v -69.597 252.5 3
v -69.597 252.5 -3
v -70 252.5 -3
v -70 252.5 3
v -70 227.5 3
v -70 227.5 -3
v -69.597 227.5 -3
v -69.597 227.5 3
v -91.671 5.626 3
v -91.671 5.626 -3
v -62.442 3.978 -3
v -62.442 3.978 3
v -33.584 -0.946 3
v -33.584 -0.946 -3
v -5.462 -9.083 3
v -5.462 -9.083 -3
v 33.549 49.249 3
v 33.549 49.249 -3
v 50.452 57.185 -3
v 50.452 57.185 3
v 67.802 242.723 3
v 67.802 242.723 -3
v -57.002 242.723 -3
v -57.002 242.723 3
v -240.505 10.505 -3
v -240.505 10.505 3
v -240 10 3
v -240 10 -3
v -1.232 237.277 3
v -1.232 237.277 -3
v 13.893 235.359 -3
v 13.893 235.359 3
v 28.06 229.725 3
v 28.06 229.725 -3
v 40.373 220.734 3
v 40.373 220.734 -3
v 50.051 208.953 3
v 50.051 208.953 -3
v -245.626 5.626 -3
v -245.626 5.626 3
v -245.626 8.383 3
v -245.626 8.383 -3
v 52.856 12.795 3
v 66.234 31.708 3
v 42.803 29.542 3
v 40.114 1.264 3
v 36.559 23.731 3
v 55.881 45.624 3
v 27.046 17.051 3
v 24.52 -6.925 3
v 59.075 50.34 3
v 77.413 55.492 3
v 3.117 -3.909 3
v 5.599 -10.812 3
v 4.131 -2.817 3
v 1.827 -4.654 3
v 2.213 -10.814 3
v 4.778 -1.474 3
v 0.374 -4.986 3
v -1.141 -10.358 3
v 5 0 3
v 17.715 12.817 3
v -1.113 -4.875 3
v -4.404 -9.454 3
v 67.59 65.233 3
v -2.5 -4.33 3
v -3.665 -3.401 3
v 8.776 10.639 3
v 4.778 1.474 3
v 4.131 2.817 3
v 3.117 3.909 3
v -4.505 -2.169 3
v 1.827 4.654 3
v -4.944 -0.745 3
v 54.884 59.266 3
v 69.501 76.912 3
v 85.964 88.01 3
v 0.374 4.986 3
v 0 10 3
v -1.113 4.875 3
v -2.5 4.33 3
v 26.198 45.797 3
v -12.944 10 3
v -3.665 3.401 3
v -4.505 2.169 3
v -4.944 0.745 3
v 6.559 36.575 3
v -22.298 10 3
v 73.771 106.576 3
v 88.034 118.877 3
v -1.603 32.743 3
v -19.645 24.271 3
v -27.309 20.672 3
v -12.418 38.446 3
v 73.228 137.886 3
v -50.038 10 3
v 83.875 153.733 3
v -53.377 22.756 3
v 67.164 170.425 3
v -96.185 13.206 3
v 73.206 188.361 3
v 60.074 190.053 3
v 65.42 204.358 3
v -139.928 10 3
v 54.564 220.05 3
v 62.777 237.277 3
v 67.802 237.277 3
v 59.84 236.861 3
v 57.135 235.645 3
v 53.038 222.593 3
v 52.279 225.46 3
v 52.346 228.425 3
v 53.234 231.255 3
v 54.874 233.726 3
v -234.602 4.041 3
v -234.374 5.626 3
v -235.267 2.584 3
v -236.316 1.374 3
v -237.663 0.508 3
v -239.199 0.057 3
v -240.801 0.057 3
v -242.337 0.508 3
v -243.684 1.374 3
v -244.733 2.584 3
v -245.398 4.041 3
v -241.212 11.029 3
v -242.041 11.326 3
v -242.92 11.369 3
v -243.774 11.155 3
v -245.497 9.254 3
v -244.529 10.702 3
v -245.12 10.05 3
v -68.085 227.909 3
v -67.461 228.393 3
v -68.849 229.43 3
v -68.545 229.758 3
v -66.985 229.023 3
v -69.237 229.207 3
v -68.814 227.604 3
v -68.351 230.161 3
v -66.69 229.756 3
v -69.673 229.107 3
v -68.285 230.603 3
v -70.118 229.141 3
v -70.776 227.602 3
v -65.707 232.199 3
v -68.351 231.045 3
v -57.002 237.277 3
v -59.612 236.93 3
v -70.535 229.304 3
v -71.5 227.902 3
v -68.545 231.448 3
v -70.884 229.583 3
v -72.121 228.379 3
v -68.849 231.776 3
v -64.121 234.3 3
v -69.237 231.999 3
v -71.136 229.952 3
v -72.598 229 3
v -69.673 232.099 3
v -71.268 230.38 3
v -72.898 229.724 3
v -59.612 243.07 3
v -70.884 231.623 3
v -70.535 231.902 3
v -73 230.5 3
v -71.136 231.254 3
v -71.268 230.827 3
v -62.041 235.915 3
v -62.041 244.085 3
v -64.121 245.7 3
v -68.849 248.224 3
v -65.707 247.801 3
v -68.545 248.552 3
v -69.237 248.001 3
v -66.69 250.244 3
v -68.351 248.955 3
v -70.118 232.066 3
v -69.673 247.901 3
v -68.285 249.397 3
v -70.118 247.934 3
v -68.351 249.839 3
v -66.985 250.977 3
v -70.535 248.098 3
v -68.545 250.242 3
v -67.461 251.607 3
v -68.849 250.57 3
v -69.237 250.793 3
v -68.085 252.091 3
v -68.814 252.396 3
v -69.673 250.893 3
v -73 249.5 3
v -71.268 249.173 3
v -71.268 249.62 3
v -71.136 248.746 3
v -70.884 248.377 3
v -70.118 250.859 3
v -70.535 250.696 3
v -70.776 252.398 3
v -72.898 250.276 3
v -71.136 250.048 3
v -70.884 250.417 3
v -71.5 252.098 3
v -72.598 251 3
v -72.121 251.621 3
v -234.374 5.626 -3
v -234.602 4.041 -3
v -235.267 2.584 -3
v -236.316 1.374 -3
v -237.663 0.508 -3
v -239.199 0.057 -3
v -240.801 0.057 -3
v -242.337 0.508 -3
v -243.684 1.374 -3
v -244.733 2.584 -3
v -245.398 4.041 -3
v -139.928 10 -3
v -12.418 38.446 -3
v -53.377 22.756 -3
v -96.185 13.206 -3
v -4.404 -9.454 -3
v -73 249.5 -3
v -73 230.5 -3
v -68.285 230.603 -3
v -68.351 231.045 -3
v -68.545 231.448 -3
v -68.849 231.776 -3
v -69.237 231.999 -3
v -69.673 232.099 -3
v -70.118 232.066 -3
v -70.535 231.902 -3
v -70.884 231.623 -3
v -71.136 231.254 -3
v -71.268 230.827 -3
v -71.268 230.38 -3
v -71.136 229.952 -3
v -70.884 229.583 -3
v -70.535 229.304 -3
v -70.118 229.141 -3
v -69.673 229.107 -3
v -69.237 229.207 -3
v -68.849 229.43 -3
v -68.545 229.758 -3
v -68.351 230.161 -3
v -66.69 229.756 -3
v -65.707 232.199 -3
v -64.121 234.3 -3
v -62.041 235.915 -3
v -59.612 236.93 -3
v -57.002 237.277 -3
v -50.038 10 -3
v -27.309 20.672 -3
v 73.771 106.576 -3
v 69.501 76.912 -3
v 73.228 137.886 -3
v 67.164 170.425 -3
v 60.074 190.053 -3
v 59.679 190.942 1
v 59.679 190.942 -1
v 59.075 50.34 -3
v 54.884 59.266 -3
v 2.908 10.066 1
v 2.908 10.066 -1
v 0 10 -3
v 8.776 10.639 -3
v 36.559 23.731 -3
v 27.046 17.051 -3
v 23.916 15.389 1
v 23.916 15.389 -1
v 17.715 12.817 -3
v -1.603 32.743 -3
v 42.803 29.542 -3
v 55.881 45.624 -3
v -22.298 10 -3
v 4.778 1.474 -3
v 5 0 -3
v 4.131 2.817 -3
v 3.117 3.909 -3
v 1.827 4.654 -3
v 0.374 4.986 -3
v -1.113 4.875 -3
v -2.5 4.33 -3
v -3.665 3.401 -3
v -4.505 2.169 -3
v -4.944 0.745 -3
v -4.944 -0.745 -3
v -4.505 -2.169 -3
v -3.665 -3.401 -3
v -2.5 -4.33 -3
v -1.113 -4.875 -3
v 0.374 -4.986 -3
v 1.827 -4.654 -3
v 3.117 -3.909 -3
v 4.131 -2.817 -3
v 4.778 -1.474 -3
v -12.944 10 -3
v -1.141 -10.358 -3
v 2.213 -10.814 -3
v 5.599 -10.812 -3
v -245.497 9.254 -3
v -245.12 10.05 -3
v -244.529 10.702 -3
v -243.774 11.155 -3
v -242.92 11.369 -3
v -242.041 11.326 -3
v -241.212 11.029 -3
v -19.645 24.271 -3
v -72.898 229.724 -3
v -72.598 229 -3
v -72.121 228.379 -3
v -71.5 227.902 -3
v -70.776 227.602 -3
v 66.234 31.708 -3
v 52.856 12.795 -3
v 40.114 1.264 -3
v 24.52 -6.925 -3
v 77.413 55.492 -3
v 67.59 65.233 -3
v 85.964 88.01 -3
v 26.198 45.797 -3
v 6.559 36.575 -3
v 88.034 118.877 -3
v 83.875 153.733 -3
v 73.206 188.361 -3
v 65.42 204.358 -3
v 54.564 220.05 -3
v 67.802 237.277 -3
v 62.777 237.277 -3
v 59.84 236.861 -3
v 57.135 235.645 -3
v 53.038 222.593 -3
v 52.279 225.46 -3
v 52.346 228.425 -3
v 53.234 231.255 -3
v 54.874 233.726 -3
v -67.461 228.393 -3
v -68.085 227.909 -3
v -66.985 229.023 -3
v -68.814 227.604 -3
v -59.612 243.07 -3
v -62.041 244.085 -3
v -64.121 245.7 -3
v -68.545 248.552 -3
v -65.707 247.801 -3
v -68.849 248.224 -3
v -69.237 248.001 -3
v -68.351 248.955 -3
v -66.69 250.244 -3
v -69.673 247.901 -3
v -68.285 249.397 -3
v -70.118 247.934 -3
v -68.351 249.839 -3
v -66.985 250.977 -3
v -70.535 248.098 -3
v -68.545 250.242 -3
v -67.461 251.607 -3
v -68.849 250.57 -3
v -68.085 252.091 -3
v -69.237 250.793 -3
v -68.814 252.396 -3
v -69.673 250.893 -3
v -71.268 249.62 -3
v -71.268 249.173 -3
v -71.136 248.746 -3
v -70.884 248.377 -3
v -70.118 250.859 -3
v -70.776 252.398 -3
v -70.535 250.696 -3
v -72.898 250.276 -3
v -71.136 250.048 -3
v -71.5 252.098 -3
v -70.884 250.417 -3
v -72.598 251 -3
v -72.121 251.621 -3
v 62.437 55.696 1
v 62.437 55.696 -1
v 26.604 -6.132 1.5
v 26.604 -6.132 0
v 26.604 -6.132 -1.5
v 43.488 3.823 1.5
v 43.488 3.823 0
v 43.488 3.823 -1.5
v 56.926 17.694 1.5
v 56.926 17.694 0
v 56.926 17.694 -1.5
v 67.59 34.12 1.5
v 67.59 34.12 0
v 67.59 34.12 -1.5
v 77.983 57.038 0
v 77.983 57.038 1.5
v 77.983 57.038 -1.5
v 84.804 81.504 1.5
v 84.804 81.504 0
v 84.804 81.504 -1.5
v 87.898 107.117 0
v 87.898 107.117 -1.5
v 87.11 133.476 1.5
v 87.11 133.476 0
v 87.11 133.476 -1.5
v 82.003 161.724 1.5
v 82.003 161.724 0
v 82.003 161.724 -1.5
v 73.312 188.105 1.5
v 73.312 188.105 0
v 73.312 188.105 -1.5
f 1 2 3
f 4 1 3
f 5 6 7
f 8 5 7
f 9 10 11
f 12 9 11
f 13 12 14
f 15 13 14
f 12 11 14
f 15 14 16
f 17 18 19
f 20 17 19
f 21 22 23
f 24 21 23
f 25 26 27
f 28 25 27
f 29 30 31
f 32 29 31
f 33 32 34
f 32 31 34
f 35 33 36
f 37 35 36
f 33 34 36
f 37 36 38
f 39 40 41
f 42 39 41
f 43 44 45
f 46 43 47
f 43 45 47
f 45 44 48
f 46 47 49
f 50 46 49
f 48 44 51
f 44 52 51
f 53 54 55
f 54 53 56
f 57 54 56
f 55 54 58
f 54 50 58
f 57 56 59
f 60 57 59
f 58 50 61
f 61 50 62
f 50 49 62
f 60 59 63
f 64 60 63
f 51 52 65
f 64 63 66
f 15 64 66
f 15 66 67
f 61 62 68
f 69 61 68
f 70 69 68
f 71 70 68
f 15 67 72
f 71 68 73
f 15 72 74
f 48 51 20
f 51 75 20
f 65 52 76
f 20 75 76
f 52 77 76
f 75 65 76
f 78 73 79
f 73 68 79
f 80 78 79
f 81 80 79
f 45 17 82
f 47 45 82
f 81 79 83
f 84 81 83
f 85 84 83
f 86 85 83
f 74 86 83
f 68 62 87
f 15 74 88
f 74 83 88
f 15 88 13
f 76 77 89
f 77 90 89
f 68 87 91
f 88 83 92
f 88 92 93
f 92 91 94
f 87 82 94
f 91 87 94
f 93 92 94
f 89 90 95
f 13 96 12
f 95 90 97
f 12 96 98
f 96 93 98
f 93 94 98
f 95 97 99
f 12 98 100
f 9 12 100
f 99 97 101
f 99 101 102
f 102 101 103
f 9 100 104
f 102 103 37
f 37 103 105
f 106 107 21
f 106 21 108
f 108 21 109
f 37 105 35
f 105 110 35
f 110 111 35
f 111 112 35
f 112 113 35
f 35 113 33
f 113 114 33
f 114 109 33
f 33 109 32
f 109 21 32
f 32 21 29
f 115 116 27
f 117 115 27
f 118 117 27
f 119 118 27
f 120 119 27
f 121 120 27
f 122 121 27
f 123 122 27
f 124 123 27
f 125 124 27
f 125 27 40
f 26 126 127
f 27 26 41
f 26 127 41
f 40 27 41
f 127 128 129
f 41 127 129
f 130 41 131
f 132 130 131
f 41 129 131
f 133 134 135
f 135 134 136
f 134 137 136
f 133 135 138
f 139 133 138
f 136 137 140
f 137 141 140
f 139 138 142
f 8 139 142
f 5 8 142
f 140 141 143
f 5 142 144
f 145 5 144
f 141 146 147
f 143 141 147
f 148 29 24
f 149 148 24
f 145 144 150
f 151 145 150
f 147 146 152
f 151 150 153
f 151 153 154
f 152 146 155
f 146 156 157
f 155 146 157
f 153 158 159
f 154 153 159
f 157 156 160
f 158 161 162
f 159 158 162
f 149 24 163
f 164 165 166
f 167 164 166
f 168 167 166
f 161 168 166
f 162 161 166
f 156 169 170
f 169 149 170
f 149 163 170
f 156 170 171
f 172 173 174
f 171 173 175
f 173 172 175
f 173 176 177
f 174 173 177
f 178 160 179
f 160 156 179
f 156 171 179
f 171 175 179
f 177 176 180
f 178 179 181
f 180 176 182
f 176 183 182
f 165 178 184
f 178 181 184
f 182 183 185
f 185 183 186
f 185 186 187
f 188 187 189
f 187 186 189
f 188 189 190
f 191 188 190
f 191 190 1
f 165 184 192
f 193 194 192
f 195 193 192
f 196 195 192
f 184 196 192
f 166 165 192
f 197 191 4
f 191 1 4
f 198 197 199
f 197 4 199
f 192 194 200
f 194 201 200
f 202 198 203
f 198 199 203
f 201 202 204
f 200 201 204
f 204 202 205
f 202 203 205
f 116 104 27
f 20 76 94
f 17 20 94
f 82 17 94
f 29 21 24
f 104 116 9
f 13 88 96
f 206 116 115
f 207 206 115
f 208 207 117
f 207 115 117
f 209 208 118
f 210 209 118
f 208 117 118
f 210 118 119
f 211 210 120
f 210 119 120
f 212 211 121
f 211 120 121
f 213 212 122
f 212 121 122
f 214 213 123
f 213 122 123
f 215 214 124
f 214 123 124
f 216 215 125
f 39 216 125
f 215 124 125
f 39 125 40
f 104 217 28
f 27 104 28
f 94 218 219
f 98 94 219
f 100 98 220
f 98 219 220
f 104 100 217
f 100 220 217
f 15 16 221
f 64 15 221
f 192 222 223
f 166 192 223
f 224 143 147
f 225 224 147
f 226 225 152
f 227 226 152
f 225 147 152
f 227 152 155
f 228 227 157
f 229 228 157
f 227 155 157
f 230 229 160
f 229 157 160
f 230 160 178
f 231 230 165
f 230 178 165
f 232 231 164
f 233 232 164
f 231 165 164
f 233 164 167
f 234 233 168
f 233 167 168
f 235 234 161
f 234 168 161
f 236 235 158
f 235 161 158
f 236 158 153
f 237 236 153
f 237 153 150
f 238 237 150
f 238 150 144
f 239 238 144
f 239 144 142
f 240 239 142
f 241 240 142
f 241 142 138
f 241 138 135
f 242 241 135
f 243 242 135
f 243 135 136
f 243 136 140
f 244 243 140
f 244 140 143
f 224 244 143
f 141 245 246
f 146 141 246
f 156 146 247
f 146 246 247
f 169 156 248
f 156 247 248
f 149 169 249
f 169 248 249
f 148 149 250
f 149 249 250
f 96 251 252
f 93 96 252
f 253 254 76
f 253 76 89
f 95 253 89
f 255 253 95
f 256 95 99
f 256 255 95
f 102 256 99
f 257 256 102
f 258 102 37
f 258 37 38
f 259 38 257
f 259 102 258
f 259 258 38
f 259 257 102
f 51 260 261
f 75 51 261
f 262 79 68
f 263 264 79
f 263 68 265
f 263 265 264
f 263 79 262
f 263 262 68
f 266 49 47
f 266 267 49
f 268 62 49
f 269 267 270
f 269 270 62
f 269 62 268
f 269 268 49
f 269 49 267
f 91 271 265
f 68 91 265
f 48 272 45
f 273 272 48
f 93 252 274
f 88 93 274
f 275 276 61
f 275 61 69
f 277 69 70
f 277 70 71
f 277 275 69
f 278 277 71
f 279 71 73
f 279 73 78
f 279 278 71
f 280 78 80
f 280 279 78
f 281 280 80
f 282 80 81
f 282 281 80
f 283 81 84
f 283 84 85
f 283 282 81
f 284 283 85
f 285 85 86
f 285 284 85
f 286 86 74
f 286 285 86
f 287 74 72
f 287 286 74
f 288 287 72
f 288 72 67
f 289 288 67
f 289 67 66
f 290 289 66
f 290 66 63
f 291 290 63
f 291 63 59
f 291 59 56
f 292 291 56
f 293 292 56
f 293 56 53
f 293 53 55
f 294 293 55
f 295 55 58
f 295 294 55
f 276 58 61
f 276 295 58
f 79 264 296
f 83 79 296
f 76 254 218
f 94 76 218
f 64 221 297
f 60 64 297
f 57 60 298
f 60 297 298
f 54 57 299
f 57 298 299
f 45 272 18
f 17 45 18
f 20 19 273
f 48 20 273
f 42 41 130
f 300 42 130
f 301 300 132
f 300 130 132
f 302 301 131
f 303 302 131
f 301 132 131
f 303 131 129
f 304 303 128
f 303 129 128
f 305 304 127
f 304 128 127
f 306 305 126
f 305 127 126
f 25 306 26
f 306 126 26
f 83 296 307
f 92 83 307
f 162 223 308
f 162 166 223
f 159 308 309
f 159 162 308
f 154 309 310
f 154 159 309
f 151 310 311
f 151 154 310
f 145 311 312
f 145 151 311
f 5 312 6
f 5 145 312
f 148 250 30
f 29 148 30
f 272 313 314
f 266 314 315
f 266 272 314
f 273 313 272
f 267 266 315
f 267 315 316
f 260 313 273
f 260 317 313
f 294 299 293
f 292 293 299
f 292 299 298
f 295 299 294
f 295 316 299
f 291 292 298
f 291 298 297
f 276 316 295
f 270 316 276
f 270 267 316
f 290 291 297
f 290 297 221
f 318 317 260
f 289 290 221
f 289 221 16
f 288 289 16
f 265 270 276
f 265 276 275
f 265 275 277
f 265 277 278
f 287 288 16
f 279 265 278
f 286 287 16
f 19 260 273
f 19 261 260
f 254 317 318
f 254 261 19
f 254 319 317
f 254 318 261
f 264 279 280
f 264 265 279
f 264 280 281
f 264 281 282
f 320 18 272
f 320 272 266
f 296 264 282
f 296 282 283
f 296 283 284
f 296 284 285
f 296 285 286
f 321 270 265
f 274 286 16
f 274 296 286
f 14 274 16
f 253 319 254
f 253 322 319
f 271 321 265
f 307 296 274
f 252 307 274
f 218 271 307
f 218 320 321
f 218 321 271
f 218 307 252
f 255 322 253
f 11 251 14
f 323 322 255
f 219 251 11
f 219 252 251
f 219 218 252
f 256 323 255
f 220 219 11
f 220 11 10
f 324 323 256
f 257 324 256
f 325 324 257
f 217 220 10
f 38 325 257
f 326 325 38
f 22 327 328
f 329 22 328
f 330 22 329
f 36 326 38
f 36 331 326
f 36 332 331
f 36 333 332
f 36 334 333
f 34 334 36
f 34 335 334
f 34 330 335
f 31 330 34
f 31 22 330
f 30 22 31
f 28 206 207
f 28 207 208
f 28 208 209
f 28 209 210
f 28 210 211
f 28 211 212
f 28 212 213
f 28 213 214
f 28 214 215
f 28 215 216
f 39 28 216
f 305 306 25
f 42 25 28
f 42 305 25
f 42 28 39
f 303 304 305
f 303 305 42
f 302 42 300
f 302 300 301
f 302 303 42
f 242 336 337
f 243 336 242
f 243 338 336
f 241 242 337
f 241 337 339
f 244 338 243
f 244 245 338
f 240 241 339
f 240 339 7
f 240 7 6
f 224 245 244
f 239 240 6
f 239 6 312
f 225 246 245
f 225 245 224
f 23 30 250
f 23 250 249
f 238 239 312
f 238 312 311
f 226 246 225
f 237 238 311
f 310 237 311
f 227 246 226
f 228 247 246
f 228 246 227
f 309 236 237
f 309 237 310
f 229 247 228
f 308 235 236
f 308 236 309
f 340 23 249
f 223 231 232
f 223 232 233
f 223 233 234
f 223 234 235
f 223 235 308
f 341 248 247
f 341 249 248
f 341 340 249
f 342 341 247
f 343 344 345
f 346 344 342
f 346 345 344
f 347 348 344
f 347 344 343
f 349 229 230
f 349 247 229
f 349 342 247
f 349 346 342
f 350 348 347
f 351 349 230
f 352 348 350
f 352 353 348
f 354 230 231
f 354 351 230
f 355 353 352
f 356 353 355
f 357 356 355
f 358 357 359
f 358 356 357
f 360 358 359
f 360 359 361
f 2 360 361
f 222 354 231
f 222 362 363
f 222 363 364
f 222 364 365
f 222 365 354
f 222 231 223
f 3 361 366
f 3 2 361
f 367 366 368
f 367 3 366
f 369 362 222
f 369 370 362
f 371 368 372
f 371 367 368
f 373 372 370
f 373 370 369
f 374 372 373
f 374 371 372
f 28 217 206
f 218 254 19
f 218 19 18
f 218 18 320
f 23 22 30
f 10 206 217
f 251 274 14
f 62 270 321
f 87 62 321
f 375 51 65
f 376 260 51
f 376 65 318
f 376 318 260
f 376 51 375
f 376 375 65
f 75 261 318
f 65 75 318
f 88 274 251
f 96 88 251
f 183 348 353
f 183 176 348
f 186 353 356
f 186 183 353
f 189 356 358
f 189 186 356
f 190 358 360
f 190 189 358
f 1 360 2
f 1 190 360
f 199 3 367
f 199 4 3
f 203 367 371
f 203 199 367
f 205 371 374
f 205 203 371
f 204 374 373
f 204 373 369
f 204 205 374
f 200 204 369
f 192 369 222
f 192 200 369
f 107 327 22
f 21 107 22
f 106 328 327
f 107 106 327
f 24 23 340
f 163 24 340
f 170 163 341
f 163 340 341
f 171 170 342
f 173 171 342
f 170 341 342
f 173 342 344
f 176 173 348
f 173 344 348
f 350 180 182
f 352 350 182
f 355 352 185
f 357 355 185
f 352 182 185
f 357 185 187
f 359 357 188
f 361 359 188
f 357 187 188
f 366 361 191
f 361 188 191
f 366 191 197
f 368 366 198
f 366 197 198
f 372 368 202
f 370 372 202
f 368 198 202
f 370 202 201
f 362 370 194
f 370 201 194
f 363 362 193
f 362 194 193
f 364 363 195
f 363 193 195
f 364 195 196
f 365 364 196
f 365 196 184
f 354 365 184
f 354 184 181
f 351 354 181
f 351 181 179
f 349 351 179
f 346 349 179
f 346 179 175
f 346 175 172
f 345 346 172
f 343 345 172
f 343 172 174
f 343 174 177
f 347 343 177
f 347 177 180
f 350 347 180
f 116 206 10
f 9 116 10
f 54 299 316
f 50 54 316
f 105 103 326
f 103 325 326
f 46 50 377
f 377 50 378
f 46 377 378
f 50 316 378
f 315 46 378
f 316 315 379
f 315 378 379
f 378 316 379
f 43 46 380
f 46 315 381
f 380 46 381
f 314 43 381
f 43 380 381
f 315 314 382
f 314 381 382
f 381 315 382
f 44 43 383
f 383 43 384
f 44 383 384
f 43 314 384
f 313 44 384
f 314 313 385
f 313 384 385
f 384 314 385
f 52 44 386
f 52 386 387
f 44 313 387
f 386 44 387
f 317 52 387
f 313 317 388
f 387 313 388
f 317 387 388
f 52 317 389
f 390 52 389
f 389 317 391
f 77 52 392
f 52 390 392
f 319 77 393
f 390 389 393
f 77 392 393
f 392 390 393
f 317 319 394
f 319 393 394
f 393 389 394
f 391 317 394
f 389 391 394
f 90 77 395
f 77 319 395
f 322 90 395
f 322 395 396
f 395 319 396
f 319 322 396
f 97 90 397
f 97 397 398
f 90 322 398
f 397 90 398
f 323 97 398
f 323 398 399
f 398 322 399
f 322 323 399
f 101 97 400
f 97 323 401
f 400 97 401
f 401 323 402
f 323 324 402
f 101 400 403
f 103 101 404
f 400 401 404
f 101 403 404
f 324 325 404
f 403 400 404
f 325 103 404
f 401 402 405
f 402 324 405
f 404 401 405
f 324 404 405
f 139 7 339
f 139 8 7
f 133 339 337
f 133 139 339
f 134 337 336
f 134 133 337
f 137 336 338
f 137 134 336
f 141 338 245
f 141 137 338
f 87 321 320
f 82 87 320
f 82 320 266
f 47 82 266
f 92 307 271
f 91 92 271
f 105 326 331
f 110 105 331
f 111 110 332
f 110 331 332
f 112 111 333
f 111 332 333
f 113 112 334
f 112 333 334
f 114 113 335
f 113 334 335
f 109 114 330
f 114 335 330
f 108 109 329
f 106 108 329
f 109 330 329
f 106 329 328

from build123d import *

# Parameters (mm, degrees)
BOSS_EXTRUDE1_DEPTH      = 3
BOSS_EXTRUDE1_DEPTH_BACK = 3
SKETCH1_R                = 5
FILLET1_START            = -3
FILLET1_DEPTH            = 6
SKETCH3_R                = 1.5
CUT_EXTRUDE1_DEPTH       = 349.413906295
FILLET2_R                = 3
BOSS_EXTRUDE2_DEPTH      = 6


with BuildPart() as part:
    # Sketch1 → Boss-Extrude1 (new, two sides: drawn at the far end of the back side and taken through both)
    with BuildSketch(Plane.XY.offset(-BOSS_EXTRUDE1_DEPTH_BACK)):
        with BuildLine():
            Line((-139.927663014, 10), (-240, 10))
            Line((-240, 10), (-240, 5.625896326))
            Line((-240, 5.625896326), (-91.67097898, 5.625896326))
            ThreePointArc((-91.67097898, 5.625896326), (-47.943457504, 1.922411841), (-5.461660623, -9.082535478))
            Line((-5.461660623, -9.082535478), (-4.403604208, -9.454396292))
            ThreePointArc((-4.403604208, -9.454396292), (0.528404036, -10.64278059), (5.598736393, -10.81216877))
            add(Edge.make_bspline(
                [(5.598736393, -10.81216877), (36.652992265, -8.693156062), (78.227632244, 36.40065328), (94.590344538, 116.465590815), (76.626831013, 184.736667386), (63.306328088, 209.262504208), (54.564036902, 220.049625577)],
                knots=[0.015792228, 0.015792228, 0.015792228, 0.015792228, 0.284946291, 0.62839983, 0.811916795, 0.93697406, 0.93697406, 0.93697406, 0.93697406], degree=3))
            ThreePointArc((54.564036902, 220.049625577), (53.234460191, 231.254741201), (62.776823889, 237.276840954))
            Line((62.776823889, 237.276840954), (67.80233028, 237.276840954))
            Line((67.80233028, 237.276840954), (67.80233028, 242.723159046))
            Line((67.80233028, 242.723159046), (-67, 242.723159046))
            Line((-67, 242.723159046), (-67, 252.5))
            Line((-67, 252.5), (-73, 252.5))
            Line((-73, 252.5), (-73, 227.5))
            Line((-73, 227.5), (-67, 227.5))
            Line((-67, 227.5), (-67, 237.276840954))
            Line((-67, 237.276840954), (-1.231721128, 237.276840954))
            ThreePointArc((-1.231721128, 237.276840954), (28.060310534, 229.72540467), (50.050624082, 208.953466413))
            add(Edge.make_bspline(
                [(69.500855603, 76.911874598), (72.264480227, 87.944058505), (76.527253704, 125.048471021), (70.268641745, 171.941971612), (53.737198263, 203.093850369), (50.050624082, 208.953466413)],
                knots=[0.407523856, 0.407523856, 0.407523856, 0.407523856, 0.537194929, 0.818083777, 0.885362915, 0.885362915, 0.885362915, 0.885362915], degree=3))
            Line((69.500855603, 76.911874598), (-12.418485843, 38.446304136))
            ThreePointArc((-12.418485843, 38.446304136), (-74.60580128, 17.197926272), (-139.927663014, 10))
        make_face()
        Polygon((-22.297907079, 10), (-50.037756473, 10), (-27.309138693, 20.672317834), align=None, mode=Mode.SUBTRACT)
        Circle(SKETCH1_R, mode=Mode.SUBTRACT)
        with BuildLine():
            Line((-12.943777745, 10), (-19.644842204, 24.271120406))
            Line((-19.644842204, 24.271120406), (-1.602641824, 32.742911289))
            Line((-1.602641824, 32.742911289), (8.776324123, 10.639039044))
            add(Edge.make_bspline(
                [(0, 10), (2.898943299, 10), (5.824093664, 10.191306611), (8.776324123, 10.639039044)],
                knots=[0, 0, 0, 0, 0.042648611, 0.042648611, 0.042648611, 0.042648611], degree=3))
            Line((0, 10), (-12.943777745, 10))
        make_face(mode=Mode.SUBTRACT)
        with BuildLine():
            Line((17.715361457, 12.81671237), (6.559363007, 36.5754149))
            Line((6.559363007, 36.5754149), (26.197910912, 45.79677746))
            Line((26.197910912, 45.79677746), (36.559125948, 23.730708969))
            add(Edge.make_bspline(
                [(17.715361457, 12.81671237), (23.876773005, 14.918250482), (30.155524994, 18.369562648), (36.559125948, 23.730708969)],
                knots=[0.085298322, 0.085298322, 0.085298322, 0.085298322, 0.172678594, 0.172678594, 0.172678594, 0.172678594], degree=3))
        make_face(mode=Mode.SUBTRACT)
        with BuildLine():
            Line((42.802893804, 29.541618599), (33.549359894, 49.248681172))
            Line((33.549359894, 49.248681172), (50.452093063, 57.185430446))
            Line((50.452093063, 57.185430446), (55.88081154, 45.623999347))
            add(Edge.make_bspline(
                [(42.802893804, 29.541618599), (44.494170175, 31.276751032), (48.877740455, 36.117777074), (53.319758571, 41.97043023), (55.88081154, 45.623999347)],
                knots=[0.2008995, 0.2008995, 0.2008995, 0.2008995, 0.223688019, 0.259663627, 0.259663627, 0.259663627, 0.259663627], degree=3))
        make_face(mode=Mode.SUBTRACT)
        with BuildLine():
            Line((59.074920902, 50.340281449), (54.883672726, 59.266297269))
            Line((54.883672726, 59.266297269), (67.59040472, 65.232796586))
            add(Edge.make_bspline(
                [(59.074920902, 50.340281449), (62.63241948, 55.77958039), (65.668587928, 61.082137876), (67.59040472, 65.232796586)],
                knots=[0.275095684, 0.275095684, 0.275095684, 0.275095684, 0.328599987, 0.328599987, 0.328599987, 0.328599987], degree=3))
        make_face(mode=Mode.SUBTRACT)
    extrude(amount=BOSS_EXTRUDE1_DEPTH + BOSS_EXTRUDE1_DEPTH_BACK)

    # Fillet1: read off the stored shape, not the designer's step
    # Fillet1 outline → Fillet1 (add)
    with BuildSketch(Plane.XY.offset(FILLET1_START)):
        with BuildLine():
            ThreePointArc((-57.002490308, 242.723159046), (-63.994214328, 245.573627926), (-67, 252.5))
            Line((-67, 252.5), (-67, 242.723159046))
            Line((-67, 242.723159046), (-57.002490308, 242.723159046))
        make_face()
        with BuildLine():
            ThreePointArc((-67, 227.5), (-63.994214328, 234.426372074), (-57.002490308, 237.276840954))
            Line((-57.002490308, 237.276840954), (-67, 237.276840954))
            Line((-67, 237.276840954), (-67, 227.5))
        make_face()
    extrude(amount=FILLET1_DEPTH)

    # Sketch3 → Cut-Extrude1 (cut, through all)
    with BuildSketch(Plane.XY.offset(3)):
        with Locations((-69.784641705, 249.396863572)):
            Circle(SKETCH3_R)
        with Locations((-69.784641705, 230.603136428)):
            Circle(SKETCH3_R)
    extrude(amount=-CUT_EXTRUDE1_DEPTH, mode=Mode.SUBTRACT)

    # Fillet2
    fillet2_edges = [part.edges().sort_by_distance(p)[0] for p in [
        (-67, 227.5, 0),
        (-73, 227.5, 0),
        (-73, 252.5, 0),
        (-67, 252.5, 0),
    ]]
    fillet(fillet2_edges, radius=FILLET2_R)

    # Sketch4 → Boss-Extrude2 (add)
    with BuildSketch(Plane.XY.offset(3)):
        with BuildLine():
            Line((-245.625896326, 5.625896326), (-245.625896326, 8.383255638))
            ThreePointArc((-245.625896326, 8.383255638), (-243.773946623, 11.154894236), (-240.504575982, 10.504575982))
            Line((-240.504575982, 10.504575982), (-240, 10))
            Line((-240, 10), (-240, 6.942968022))
            Line((-240, 6.942968022), (-240, 5.625896326))
            Line((-240, 5.625896326), (-234.374103674, 5.625896326))
            ThreePointArc((-234.374103674, 5.625896326), (-240, 0), (-245.625896326, 5.625896326))
        make_face()
    extrude(amount=-BOSS_EXTRUDE2_DEPTH)


solid = part.part
